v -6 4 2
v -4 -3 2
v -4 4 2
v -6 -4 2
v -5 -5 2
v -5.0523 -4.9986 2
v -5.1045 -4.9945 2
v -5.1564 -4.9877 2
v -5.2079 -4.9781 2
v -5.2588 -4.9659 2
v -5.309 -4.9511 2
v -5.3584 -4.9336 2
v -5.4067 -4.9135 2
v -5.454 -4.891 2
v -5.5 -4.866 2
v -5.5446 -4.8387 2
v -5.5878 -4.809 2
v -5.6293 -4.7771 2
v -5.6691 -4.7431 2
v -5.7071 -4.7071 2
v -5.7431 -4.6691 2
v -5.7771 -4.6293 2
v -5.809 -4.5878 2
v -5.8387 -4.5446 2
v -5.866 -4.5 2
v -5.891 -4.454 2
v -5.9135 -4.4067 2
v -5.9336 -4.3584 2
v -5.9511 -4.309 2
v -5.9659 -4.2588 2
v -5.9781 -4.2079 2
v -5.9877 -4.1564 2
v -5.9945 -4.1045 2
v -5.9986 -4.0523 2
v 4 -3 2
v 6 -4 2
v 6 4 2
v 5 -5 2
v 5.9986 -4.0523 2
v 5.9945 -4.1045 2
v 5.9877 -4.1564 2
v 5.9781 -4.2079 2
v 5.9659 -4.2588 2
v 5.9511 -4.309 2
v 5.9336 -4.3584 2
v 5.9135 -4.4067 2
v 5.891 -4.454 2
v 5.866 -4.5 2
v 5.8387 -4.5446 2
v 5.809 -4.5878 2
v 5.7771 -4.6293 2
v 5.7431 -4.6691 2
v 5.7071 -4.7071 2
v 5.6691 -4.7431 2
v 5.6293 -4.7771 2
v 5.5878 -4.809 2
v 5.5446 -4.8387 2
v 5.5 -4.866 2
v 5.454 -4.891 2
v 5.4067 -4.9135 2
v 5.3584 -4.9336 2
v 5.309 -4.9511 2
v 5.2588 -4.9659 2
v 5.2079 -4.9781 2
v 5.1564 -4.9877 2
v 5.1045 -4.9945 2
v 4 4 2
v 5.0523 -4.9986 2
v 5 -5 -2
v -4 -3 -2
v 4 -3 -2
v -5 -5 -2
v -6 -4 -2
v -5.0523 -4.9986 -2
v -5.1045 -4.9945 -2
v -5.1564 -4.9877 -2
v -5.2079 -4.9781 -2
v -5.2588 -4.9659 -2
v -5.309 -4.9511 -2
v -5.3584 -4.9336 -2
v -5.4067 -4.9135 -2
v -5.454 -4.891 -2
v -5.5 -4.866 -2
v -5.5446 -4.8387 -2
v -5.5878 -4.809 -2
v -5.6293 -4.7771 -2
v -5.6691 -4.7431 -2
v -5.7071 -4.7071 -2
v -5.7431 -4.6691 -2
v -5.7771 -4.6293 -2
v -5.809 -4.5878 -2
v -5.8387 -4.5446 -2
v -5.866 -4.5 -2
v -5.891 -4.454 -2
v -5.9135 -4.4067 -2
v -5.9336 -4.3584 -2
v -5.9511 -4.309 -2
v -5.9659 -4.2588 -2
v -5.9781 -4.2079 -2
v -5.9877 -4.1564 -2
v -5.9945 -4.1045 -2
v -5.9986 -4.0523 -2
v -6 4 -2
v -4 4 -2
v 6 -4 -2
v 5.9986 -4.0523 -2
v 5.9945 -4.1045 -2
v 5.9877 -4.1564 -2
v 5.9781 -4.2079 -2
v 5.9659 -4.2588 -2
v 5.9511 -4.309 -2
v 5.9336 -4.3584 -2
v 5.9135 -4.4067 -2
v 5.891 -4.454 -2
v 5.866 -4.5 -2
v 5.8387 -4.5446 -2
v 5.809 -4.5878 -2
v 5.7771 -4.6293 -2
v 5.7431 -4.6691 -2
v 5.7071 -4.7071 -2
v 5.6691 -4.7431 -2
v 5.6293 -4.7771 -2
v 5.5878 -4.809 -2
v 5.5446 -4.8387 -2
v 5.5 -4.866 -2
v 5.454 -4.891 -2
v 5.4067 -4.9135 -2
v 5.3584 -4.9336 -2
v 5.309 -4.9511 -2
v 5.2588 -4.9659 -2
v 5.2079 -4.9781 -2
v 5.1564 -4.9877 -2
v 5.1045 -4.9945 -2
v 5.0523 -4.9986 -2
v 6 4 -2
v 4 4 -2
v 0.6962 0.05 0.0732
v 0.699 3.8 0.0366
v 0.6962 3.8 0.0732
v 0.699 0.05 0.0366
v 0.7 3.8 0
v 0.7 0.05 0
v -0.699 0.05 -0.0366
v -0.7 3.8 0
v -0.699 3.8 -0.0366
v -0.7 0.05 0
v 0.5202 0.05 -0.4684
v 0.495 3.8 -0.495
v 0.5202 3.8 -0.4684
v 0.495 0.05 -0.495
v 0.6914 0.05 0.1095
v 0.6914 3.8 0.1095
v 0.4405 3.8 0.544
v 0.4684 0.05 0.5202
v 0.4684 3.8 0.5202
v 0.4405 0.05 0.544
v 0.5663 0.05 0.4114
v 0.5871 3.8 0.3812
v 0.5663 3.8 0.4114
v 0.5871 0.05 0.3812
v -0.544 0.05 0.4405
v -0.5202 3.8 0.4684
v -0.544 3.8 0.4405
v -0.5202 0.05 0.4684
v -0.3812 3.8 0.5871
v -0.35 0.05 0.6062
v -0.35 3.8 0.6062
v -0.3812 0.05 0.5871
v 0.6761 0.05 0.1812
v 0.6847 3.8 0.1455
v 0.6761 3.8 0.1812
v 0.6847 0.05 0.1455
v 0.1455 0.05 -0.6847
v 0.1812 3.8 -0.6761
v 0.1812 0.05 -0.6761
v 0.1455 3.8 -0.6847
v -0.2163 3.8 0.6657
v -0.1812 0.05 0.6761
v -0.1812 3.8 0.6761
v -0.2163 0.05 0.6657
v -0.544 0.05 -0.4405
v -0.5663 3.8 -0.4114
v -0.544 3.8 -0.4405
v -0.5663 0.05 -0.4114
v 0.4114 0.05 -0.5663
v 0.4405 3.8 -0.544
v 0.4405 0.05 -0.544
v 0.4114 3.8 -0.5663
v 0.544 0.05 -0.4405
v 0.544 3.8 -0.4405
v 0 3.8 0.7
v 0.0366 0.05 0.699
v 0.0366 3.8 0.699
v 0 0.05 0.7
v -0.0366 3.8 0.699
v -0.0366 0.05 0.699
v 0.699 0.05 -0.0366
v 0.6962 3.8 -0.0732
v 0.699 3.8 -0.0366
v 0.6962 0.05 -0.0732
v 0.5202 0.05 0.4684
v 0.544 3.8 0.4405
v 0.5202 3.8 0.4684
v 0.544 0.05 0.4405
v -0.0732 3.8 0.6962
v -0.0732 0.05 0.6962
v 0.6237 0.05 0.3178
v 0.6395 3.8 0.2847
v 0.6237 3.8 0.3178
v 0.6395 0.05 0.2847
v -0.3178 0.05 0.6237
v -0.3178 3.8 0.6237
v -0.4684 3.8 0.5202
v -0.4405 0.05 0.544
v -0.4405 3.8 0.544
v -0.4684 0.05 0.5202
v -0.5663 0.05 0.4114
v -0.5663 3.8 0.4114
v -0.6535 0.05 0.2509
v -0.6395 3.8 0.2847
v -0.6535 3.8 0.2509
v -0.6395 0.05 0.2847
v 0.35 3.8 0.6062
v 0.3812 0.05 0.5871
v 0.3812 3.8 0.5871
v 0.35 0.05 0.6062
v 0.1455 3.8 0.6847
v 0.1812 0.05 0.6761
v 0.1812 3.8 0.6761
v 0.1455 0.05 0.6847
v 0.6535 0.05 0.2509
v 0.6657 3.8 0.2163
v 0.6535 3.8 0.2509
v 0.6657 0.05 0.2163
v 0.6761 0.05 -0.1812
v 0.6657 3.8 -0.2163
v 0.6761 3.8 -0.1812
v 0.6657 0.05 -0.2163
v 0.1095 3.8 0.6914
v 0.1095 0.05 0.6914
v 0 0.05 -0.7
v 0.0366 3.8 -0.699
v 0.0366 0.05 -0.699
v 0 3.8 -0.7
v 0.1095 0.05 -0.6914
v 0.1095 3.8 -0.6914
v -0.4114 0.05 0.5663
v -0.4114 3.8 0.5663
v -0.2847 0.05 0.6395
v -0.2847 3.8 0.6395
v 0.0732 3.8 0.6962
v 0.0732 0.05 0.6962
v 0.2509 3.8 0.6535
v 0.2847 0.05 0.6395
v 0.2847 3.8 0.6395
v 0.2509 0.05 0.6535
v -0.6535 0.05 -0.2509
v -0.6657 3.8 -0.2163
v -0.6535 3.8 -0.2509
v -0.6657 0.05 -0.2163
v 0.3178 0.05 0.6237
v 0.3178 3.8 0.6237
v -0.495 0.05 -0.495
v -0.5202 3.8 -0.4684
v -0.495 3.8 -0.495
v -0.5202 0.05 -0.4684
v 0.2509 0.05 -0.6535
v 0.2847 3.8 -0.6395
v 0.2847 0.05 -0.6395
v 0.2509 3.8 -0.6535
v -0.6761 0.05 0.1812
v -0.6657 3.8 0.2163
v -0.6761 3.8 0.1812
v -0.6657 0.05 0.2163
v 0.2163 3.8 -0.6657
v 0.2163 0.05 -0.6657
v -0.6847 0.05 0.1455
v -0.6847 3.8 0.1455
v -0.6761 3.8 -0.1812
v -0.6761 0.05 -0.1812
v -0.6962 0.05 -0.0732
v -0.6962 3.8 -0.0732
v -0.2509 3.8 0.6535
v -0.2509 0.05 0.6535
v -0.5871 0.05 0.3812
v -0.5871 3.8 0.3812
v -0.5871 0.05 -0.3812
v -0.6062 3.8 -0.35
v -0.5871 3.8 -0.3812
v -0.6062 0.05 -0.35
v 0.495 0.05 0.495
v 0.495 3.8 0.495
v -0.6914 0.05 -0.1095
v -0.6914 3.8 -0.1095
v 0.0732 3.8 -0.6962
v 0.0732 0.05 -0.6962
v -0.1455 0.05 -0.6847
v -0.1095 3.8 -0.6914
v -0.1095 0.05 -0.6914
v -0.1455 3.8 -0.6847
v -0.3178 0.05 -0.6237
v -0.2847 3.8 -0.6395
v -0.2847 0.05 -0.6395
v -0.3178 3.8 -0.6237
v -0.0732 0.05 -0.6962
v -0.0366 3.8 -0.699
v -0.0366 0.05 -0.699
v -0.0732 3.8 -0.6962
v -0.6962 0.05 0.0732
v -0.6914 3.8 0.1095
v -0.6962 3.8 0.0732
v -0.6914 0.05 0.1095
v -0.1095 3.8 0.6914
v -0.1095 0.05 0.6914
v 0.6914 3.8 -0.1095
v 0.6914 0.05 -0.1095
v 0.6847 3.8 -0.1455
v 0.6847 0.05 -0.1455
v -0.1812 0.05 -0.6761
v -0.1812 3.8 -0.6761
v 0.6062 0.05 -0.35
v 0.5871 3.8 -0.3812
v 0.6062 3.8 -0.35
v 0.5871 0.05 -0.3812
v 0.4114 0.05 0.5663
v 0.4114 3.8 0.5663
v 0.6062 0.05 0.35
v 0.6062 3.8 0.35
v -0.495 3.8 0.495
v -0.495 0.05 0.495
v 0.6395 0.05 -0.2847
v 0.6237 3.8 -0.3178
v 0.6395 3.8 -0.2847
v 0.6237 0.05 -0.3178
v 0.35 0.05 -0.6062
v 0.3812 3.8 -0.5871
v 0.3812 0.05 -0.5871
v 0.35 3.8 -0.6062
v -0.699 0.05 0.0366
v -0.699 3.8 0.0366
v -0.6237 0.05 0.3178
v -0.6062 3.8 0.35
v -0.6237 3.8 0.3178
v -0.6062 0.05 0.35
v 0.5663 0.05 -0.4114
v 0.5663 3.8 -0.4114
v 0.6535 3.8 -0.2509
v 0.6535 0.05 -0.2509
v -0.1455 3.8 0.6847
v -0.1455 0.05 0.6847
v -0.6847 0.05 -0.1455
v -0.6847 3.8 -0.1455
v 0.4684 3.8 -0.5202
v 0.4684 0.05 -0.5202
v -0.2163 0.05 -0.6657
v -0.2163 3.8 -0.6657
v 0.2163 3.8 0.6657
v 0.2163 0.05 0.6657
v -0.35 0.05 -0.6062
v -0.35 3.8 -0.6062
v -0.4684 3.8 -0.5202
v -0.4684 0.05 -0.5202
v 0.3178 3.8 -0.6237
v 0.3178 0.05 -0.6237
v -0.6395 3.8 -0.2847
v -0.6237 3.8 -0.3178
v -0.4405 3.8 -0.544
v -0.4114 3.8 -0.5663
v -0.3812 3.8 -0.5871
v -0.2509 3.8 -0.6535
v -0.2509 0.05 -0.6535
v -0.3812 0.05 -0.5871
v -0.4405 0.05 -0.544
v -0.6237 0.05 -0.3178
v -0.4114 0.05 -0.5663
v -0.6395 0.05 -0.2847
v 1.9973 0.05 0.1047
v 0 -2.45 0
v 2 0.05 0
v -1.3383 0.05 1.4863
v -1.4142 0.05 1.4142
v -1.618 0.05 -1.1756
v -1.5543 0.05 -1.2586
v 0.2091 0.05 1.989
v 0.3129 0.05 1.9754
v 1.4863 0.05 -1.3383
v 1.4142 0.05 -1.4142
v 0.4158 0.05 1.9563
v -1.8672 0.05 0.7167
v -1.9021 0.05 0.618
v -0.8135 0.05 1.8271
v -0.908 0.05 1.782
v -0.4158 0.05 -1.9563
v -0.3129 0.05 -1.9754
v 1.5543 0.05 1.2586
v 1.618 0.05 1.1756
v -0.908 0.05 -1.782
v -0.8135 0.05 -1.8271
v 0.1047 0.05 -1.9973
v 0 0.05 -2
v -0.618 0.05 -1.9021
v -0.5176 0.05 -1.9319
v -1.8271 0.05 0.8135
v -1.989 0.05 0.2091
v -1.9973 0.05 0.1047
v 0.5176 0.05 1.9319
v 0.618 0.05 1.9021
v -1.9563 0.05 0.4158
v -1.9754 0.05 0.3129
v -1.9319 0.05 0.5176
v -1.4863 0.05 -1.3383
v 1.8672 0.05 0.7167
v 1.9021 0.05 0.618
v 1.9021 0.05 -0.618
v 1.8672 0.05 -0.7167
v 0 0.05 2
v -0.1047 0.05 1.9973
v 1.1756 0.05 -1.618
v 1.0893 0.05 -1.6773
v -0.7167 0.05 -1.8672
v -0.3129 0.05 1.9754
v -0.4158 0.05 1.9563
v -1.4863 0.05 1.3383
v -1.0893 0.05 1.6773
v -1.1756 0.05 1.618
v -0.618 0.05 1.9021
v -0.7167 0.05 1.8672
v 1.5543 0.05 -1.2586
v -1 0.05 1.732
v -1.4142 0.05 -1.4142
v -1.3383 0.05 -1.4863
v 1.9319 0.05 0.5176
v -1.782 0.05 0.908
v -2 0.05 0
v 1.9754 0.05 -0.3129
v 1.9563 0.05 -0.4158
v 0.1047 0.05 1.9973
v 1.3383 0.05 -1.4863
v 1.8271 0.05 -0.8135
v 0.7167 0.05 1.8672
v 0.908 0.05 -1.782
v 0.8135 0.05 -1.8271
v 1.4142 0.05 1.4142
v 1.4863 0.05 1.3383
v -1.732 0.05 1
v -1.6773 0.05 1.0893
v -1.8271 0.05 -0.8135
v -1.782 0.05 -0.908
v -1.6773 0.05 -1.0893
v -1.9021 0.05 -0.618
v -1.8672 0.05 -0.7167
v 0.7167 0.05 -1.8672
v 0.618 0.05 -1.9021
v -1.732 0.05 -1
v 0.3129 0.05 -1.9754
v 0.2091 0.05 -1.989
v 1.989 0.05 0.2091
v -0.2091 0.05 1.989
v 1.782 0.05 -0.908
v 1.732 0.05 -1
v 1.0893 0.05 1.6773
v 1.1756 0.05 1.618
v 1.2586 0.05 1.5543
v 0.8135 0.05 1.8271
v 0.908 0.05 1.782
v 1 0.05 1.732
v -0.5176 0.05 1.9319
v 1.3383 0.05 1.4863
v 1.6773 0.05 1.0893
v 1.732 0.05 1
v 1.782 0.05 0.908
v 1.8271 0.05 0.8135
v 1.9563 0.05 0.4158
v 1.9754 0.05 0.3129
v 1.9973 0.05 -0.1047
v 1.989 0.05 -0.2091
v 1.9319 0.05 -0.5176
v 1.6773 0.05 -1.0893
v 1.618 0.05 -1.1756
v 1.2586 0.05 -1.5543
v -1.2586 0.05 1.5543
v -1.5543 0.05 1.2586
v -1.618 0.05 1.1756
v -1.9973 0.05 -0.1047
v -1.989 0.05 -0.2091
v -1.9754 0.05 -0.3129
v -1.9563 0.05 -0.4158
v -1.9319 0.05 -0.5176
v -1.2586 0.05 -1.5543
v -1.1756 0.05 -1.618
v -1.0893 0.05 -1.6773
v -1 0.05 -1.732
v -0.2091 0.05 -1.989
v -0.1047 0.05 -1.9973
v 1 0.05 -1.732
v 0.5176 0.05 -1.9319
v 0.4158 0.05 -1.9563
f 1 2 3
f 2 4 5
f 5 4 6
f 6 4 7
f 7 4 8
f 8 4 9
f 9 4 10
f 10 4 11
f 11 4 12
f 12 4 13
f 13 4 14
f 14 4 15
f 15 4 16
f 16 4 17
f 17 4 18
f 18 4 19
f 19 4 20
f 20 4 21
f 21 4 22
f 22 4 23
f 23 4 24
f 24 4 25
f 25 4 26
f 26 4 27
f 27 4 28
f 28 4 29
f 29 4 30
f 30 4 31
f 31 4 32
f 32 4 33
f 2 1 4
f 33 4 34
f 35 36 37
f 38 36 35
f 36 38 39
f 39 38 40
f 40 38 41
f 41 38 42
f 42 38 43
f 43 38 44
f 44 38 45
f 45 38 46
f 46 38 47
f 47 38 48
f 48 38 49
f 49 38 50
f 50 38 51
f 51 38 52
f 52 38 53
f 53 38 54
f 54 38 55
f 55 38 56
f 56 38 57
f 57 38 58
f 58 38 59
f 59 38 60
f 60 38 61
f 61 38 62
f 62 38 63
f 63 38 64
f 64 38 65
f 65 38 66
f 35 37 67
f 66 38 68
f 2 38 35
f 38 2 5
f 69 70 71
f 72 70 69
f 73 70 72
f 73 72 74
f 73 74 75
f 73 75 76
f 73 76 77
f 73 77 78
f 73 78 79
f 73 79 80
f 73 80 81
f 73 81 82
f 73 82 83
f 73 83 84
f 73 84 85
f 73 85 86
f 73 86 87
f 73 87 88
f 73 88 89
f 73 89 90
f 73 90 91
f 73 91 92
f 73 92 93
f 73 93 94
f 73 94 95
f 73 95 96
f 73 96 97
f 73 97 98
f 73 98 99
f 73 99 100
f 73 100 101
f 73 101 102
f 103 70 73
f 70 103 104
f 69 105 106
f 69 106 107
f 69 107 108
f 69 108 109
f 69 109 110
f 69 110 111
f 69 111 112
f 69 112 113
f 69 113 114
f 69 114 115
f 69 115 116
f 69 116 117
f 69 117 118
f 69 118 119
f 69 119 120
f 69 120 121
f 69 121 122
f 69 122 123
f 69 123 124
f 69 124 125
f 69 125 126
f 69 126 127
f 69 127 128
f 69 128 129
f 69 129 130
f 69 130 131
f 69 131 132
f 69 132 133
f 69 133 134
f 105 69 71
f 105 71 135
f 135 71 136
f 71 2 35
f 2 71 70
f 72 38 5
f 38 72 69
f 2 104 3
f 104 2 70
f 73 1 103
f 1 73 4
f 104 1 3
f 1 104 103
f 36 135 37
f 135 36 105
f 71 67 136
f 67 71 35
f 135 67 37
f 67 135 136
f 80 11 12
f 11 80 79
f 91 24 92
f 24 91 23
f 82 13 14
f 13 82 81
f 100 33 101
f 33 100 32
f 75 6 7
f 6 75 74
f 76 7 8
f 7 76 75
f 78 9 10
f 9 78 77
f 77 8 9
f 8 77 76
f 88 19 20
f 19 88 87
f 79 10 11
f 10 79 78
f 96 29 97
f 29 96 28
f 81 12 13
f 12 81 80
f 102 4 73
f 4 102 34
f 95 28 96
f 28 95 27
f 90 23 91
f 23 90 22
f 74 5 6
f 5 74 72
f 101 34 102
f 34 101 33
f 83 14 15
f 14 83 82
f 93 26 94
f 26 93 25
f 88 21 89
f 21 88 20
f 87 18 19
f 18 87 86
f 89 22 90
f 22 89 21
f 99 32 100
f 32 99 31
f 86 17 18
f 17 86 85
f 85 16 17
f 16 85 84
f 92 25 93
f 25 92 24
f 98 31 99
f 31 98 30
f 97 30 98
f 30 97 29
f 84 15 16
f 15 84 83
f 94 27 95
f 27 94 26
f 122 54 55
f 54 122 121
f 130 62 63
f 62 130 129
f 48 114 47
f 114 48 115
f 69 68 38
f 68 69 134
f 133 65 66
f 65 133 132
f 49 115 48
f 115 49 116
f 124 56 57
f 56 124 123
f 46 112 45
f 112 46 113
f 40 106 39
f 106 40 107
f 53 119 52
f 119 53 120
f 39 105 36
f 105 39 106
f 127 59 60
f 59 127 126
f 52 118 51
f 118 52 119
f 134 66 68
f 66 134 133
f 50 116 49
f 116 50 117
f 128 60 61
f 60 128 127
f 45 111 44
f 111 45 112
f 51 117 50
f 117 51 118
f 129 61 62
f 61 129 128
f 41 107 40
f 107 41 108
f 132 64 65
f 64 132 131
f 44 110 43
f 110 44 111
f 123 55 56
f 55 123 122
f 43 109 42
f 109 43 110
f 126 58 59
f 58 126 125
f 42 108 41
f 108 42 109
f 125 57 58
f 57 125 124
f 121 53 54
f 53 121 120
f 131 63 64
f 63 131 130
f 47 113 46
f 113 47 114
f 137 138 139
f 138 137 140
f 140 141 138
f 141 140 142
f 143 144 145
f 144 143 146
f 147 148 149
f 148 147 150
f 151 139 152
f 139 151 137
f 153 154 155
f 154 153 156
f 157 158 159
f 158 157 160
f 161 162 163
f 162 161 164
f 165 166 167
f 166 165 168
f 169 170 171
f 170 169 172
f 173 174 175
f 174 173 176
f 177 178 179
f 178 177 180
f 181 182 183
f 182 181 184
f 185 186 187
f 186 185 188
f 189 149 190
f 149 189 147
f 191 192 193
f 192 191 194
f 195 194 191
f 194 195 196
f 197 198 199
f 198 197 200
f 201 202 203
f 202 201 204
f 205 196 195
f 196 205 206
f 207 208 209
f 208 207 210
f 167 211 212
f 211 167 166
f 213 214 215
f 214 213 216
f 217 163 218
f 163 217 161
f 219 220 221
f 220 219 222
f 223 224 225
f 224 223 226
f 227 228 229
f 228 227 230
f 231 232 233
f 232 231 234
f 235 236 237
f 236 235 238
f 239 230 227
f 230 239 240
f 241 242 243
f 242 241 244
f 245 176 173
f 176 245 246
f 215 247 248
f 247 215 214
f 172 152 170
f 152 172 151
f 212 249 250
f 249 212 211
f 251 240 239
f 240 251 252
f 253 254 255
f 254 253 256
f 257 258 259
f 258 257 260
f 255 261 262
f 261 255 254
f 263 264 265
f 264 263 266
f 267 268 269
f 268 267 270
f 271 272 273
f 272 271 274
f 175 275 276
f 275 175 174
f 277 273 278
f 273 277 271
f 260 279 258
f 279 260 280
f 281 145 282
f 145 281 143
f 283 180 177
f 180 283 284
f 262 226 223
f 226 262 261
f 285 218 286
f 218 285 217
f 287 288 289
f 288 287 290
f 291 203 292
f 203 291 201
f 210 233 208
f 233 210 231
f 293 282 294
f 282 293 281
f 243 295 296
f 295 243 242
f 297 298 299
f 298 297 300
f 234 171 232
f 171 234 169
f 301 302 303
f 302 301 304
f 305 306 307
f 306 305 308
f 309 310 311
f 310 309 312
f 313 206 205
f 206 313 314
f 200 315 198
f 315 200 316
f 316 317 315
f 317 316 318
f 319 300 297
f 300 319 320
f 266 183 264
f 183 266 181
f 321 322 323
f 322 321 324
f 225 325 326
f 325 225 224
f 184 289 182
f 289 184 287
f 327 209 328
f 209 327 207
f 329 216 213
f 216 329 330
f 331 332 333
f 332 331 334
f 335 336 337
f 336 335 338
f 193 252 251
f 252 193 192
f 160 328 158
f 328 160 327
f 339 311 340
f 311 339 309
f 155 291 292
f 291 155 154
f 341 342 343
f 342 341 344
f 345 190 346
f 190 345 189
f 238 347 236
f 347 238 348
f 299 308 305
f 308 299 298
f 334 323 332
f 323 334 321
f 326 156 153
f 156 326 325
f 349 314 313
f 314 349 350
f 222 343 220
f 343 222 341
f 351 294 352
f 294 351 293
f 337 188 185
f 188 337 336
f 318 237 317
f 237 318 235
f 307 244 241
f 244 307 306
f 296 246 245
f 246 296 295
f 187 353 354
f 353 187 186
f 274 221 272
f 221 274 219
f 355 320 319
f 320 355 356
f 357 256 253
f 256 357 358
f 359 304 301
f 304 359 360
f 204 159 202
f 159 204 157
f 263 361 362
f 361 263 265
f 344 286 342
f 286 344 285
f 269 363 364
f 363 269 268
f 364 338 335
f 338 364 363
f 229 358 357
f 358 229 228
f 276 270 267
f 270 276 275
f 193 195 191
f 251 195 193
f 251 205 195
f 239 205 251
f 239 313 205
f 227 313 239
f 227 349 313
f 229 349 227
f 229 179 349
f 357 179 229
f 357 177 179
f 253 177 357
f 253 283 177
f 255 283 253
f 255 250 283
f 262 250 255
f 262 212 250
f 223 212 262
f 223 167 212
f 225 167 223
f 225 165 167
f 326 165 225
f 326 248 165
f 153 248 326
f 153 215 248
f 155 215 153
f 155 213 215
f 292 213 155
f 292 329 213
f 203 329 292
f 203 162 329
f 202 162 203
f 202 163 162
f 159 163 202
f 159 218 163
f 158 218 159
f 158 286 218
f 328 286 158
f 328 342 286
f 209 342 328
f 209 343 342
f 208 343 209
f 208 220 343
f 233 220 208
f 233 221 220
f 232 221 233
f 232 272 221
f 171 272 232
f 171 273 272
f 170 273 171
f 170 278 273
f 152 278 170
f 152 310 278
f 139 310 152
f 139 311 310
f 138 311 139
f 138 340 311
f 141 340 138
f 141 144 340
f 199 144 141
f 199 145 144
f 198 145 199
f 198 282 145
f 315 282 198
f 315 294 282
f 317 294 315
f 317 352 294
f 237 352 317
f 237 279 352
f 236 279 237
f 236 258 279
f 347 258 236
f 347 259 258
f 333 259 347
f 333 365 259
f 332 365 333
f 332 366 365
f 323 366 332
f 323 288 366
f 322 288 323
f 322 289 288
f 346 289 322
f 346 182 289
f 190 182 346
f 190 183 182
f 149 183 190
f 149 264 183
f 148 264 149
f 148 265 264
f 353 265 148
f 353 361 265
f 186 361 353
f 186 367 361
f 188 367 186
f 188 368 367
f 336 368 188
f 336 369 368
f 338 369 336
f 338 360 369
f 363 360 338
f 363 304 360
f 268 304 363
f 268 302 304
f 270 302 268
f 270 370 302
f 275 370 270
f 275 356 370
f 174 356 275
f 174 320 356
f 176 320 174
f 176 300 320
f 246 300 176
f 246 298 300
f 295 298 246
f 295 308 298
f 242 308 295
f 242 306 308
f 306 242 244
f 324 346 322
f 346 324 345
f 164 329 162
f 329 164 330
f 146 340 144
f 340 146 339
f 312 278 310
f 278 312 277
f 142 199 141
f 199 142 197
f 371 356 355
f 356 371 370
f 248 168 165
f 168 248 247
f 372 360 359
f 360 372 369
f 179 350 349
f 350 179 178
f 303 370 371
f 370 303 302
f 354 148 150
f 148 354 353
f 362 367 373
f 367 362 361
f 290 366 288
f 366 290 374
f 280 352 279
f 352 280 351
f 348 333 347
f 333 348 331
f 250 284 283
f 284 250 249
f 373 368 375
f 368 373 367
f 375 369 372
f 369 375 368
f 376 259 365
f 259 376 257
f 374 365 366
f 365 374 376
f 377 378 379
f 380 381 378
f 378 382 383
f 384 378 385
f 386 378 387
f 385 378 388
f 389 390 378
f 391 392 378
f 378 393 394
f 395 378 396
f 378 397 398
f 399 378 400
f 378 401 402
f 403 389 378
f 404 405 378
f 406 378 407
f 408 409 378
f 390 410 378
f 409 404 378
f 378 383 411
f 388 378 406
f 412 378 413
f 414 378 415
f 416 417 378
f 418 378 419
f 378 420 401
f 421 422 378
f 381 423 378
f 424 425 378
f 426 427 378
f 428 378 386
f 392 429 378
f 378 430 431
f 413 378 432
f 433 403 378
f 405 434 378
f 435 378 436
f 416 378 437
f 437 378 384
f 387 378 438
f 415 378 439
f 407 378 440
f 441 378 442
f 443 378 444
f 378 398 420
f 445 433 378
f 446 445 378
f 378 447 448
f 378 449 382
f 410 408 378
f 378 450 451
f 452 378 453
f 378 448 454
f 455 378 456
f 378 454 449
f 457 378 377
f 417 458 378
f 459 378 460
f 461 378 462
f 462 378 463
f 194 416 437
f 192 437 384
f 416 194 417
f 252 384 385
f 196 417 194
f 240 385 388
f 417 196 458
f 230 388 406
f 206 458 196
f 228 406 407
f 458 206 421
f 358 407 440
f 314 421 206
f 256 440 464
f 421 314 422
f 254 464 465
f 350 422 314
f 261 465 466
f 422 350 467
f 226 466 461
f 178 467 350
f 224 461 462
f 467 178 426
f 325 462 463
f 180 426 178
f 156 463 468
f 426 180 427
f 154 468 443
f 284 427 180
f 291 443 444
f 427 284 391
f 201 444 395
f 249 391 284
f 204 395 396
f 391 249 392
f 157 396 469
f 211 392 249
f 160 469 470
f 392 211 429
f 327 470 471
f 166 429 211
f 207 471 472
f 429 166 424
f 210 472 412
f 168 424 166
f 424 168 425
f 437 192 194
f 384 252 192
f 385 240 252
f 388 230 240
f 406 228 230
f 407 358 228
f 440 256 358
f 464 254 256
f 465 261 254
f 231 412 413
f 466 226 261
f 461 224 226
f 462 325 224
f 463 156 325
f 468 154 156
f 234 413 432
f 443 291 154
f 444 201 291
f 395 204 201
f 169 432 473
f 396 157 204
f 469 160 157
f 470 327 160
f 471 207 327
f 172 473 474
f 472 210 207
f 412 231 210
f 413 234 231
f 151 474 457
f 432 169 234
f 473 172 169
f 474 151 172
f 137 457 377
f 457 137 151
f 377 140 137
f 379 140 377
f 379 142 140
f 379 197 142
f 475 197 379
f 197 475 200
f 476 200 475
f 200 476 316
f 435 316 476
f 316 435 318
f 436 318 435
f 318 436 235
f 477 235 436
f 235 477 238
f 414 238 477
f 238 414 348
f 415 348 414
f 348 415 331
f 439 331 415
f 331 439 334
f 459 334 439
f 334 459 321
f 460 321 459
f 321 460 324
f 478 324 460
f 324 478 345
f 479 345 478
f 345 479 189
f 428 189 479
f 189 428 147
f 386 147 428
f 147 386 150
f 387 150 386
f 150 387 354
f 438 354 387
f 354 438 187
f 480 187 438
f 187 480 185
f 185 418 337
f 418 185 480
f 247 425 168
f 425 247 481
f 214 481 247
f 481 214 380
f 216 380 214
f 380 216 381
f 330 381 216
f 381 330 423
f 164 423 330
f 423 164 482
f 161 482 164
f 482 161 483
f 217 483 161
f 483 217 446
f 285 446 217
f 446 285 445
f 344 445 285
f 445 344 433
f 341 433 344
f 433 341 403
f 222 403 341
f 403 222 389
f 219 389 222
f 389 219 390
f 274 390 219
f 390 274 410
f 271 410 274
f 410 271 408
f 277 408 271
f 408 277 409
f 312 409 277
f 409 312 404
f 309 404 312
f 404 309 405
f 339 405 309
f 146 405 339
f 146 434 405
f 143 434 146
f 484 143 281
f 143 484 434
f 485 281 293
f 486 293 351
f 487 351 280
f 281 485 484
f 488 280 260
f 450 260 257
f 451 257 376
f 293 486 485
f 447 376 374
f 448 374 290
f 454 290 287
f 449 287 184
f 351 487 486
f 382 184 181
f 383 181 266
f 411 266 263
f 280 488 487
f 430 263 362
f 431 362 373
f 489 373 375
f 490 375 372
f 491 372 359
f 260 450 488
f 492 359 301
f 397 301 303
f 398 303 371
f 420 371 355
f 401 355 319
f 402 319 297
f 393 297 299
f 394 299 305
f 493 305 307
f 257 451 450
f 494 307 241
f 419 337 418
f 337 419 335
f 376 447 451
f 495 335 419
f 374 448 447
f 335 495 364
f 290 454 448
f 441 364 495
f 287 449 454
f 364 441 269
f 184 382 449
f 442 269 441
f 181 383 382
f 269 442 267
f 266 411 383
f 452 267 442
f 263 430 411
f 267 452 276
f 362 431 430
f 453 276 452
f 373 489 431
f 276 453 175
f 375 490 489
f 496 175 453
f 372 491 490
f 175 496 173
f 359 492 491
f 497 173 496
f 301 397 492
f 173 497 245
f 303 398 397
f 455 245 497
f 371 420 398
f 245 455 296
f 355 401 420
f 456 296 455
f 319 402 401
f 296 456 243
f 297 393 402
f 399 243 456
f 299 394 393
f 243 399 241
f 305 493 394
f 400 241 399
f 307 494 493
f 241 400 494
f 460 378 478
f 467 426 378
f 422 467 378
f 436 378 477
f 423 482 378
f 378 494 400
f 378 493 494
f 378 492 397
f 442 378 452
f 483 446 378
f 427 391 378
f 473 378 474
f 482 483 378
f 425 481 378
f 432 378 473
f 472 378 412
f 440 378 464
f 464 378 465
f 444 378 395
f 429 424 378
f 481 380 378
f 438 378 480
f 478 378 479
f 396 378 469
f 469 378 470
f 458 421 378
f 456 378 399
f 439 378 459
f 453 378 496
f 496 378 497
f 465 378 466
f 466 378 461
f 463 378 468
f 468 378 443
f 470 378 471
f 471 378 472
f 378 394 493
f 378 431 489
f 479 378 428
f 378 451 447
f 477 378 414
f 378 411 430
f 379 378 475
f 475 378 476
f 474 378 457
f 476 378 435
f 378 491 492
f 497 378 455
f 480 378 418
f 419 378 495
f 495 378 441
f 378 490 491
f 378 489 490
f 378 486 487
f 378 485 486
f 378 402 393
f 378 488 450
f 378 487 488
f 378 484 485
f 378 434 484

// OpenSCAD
//=============================================================================
// 3D icon used for creating ImportedaModel.
// =============================================================================

module CreateImportedModelIcon() {
     w = 10;
     h =  8;
     t =  2;
     d =  4;
     module _Bottom() {
          translate([0, -h/2, 0]) cube([w, t, d], center = true);
          translate([-w/2, 0, 0]) cube([t, h, d], center = true);
          translate([ w/2, 0, 0]) cube([t, h, d], center = true);
          translate([-w/2, -h/2, 0]) cylinder(d=t, h=d, center = true);
          translate([ w/2, -h/2, 0]) cylinder(d=t, h=d, center = true);
     }
     module _Arrow() {
          rotate([90, 0, 0]) cylinder(r=.7, h=4, center = true);
          translate([0, -3, 0]) rotate([90, 0, 0])
               cylinder(d1=d, d2=0, h=2.5, center = true);
     }
     _Bottom();
     translate([0, 1.8, 0]) _Arrow();
}

CreateImportedModelIcon($fn = 120);
